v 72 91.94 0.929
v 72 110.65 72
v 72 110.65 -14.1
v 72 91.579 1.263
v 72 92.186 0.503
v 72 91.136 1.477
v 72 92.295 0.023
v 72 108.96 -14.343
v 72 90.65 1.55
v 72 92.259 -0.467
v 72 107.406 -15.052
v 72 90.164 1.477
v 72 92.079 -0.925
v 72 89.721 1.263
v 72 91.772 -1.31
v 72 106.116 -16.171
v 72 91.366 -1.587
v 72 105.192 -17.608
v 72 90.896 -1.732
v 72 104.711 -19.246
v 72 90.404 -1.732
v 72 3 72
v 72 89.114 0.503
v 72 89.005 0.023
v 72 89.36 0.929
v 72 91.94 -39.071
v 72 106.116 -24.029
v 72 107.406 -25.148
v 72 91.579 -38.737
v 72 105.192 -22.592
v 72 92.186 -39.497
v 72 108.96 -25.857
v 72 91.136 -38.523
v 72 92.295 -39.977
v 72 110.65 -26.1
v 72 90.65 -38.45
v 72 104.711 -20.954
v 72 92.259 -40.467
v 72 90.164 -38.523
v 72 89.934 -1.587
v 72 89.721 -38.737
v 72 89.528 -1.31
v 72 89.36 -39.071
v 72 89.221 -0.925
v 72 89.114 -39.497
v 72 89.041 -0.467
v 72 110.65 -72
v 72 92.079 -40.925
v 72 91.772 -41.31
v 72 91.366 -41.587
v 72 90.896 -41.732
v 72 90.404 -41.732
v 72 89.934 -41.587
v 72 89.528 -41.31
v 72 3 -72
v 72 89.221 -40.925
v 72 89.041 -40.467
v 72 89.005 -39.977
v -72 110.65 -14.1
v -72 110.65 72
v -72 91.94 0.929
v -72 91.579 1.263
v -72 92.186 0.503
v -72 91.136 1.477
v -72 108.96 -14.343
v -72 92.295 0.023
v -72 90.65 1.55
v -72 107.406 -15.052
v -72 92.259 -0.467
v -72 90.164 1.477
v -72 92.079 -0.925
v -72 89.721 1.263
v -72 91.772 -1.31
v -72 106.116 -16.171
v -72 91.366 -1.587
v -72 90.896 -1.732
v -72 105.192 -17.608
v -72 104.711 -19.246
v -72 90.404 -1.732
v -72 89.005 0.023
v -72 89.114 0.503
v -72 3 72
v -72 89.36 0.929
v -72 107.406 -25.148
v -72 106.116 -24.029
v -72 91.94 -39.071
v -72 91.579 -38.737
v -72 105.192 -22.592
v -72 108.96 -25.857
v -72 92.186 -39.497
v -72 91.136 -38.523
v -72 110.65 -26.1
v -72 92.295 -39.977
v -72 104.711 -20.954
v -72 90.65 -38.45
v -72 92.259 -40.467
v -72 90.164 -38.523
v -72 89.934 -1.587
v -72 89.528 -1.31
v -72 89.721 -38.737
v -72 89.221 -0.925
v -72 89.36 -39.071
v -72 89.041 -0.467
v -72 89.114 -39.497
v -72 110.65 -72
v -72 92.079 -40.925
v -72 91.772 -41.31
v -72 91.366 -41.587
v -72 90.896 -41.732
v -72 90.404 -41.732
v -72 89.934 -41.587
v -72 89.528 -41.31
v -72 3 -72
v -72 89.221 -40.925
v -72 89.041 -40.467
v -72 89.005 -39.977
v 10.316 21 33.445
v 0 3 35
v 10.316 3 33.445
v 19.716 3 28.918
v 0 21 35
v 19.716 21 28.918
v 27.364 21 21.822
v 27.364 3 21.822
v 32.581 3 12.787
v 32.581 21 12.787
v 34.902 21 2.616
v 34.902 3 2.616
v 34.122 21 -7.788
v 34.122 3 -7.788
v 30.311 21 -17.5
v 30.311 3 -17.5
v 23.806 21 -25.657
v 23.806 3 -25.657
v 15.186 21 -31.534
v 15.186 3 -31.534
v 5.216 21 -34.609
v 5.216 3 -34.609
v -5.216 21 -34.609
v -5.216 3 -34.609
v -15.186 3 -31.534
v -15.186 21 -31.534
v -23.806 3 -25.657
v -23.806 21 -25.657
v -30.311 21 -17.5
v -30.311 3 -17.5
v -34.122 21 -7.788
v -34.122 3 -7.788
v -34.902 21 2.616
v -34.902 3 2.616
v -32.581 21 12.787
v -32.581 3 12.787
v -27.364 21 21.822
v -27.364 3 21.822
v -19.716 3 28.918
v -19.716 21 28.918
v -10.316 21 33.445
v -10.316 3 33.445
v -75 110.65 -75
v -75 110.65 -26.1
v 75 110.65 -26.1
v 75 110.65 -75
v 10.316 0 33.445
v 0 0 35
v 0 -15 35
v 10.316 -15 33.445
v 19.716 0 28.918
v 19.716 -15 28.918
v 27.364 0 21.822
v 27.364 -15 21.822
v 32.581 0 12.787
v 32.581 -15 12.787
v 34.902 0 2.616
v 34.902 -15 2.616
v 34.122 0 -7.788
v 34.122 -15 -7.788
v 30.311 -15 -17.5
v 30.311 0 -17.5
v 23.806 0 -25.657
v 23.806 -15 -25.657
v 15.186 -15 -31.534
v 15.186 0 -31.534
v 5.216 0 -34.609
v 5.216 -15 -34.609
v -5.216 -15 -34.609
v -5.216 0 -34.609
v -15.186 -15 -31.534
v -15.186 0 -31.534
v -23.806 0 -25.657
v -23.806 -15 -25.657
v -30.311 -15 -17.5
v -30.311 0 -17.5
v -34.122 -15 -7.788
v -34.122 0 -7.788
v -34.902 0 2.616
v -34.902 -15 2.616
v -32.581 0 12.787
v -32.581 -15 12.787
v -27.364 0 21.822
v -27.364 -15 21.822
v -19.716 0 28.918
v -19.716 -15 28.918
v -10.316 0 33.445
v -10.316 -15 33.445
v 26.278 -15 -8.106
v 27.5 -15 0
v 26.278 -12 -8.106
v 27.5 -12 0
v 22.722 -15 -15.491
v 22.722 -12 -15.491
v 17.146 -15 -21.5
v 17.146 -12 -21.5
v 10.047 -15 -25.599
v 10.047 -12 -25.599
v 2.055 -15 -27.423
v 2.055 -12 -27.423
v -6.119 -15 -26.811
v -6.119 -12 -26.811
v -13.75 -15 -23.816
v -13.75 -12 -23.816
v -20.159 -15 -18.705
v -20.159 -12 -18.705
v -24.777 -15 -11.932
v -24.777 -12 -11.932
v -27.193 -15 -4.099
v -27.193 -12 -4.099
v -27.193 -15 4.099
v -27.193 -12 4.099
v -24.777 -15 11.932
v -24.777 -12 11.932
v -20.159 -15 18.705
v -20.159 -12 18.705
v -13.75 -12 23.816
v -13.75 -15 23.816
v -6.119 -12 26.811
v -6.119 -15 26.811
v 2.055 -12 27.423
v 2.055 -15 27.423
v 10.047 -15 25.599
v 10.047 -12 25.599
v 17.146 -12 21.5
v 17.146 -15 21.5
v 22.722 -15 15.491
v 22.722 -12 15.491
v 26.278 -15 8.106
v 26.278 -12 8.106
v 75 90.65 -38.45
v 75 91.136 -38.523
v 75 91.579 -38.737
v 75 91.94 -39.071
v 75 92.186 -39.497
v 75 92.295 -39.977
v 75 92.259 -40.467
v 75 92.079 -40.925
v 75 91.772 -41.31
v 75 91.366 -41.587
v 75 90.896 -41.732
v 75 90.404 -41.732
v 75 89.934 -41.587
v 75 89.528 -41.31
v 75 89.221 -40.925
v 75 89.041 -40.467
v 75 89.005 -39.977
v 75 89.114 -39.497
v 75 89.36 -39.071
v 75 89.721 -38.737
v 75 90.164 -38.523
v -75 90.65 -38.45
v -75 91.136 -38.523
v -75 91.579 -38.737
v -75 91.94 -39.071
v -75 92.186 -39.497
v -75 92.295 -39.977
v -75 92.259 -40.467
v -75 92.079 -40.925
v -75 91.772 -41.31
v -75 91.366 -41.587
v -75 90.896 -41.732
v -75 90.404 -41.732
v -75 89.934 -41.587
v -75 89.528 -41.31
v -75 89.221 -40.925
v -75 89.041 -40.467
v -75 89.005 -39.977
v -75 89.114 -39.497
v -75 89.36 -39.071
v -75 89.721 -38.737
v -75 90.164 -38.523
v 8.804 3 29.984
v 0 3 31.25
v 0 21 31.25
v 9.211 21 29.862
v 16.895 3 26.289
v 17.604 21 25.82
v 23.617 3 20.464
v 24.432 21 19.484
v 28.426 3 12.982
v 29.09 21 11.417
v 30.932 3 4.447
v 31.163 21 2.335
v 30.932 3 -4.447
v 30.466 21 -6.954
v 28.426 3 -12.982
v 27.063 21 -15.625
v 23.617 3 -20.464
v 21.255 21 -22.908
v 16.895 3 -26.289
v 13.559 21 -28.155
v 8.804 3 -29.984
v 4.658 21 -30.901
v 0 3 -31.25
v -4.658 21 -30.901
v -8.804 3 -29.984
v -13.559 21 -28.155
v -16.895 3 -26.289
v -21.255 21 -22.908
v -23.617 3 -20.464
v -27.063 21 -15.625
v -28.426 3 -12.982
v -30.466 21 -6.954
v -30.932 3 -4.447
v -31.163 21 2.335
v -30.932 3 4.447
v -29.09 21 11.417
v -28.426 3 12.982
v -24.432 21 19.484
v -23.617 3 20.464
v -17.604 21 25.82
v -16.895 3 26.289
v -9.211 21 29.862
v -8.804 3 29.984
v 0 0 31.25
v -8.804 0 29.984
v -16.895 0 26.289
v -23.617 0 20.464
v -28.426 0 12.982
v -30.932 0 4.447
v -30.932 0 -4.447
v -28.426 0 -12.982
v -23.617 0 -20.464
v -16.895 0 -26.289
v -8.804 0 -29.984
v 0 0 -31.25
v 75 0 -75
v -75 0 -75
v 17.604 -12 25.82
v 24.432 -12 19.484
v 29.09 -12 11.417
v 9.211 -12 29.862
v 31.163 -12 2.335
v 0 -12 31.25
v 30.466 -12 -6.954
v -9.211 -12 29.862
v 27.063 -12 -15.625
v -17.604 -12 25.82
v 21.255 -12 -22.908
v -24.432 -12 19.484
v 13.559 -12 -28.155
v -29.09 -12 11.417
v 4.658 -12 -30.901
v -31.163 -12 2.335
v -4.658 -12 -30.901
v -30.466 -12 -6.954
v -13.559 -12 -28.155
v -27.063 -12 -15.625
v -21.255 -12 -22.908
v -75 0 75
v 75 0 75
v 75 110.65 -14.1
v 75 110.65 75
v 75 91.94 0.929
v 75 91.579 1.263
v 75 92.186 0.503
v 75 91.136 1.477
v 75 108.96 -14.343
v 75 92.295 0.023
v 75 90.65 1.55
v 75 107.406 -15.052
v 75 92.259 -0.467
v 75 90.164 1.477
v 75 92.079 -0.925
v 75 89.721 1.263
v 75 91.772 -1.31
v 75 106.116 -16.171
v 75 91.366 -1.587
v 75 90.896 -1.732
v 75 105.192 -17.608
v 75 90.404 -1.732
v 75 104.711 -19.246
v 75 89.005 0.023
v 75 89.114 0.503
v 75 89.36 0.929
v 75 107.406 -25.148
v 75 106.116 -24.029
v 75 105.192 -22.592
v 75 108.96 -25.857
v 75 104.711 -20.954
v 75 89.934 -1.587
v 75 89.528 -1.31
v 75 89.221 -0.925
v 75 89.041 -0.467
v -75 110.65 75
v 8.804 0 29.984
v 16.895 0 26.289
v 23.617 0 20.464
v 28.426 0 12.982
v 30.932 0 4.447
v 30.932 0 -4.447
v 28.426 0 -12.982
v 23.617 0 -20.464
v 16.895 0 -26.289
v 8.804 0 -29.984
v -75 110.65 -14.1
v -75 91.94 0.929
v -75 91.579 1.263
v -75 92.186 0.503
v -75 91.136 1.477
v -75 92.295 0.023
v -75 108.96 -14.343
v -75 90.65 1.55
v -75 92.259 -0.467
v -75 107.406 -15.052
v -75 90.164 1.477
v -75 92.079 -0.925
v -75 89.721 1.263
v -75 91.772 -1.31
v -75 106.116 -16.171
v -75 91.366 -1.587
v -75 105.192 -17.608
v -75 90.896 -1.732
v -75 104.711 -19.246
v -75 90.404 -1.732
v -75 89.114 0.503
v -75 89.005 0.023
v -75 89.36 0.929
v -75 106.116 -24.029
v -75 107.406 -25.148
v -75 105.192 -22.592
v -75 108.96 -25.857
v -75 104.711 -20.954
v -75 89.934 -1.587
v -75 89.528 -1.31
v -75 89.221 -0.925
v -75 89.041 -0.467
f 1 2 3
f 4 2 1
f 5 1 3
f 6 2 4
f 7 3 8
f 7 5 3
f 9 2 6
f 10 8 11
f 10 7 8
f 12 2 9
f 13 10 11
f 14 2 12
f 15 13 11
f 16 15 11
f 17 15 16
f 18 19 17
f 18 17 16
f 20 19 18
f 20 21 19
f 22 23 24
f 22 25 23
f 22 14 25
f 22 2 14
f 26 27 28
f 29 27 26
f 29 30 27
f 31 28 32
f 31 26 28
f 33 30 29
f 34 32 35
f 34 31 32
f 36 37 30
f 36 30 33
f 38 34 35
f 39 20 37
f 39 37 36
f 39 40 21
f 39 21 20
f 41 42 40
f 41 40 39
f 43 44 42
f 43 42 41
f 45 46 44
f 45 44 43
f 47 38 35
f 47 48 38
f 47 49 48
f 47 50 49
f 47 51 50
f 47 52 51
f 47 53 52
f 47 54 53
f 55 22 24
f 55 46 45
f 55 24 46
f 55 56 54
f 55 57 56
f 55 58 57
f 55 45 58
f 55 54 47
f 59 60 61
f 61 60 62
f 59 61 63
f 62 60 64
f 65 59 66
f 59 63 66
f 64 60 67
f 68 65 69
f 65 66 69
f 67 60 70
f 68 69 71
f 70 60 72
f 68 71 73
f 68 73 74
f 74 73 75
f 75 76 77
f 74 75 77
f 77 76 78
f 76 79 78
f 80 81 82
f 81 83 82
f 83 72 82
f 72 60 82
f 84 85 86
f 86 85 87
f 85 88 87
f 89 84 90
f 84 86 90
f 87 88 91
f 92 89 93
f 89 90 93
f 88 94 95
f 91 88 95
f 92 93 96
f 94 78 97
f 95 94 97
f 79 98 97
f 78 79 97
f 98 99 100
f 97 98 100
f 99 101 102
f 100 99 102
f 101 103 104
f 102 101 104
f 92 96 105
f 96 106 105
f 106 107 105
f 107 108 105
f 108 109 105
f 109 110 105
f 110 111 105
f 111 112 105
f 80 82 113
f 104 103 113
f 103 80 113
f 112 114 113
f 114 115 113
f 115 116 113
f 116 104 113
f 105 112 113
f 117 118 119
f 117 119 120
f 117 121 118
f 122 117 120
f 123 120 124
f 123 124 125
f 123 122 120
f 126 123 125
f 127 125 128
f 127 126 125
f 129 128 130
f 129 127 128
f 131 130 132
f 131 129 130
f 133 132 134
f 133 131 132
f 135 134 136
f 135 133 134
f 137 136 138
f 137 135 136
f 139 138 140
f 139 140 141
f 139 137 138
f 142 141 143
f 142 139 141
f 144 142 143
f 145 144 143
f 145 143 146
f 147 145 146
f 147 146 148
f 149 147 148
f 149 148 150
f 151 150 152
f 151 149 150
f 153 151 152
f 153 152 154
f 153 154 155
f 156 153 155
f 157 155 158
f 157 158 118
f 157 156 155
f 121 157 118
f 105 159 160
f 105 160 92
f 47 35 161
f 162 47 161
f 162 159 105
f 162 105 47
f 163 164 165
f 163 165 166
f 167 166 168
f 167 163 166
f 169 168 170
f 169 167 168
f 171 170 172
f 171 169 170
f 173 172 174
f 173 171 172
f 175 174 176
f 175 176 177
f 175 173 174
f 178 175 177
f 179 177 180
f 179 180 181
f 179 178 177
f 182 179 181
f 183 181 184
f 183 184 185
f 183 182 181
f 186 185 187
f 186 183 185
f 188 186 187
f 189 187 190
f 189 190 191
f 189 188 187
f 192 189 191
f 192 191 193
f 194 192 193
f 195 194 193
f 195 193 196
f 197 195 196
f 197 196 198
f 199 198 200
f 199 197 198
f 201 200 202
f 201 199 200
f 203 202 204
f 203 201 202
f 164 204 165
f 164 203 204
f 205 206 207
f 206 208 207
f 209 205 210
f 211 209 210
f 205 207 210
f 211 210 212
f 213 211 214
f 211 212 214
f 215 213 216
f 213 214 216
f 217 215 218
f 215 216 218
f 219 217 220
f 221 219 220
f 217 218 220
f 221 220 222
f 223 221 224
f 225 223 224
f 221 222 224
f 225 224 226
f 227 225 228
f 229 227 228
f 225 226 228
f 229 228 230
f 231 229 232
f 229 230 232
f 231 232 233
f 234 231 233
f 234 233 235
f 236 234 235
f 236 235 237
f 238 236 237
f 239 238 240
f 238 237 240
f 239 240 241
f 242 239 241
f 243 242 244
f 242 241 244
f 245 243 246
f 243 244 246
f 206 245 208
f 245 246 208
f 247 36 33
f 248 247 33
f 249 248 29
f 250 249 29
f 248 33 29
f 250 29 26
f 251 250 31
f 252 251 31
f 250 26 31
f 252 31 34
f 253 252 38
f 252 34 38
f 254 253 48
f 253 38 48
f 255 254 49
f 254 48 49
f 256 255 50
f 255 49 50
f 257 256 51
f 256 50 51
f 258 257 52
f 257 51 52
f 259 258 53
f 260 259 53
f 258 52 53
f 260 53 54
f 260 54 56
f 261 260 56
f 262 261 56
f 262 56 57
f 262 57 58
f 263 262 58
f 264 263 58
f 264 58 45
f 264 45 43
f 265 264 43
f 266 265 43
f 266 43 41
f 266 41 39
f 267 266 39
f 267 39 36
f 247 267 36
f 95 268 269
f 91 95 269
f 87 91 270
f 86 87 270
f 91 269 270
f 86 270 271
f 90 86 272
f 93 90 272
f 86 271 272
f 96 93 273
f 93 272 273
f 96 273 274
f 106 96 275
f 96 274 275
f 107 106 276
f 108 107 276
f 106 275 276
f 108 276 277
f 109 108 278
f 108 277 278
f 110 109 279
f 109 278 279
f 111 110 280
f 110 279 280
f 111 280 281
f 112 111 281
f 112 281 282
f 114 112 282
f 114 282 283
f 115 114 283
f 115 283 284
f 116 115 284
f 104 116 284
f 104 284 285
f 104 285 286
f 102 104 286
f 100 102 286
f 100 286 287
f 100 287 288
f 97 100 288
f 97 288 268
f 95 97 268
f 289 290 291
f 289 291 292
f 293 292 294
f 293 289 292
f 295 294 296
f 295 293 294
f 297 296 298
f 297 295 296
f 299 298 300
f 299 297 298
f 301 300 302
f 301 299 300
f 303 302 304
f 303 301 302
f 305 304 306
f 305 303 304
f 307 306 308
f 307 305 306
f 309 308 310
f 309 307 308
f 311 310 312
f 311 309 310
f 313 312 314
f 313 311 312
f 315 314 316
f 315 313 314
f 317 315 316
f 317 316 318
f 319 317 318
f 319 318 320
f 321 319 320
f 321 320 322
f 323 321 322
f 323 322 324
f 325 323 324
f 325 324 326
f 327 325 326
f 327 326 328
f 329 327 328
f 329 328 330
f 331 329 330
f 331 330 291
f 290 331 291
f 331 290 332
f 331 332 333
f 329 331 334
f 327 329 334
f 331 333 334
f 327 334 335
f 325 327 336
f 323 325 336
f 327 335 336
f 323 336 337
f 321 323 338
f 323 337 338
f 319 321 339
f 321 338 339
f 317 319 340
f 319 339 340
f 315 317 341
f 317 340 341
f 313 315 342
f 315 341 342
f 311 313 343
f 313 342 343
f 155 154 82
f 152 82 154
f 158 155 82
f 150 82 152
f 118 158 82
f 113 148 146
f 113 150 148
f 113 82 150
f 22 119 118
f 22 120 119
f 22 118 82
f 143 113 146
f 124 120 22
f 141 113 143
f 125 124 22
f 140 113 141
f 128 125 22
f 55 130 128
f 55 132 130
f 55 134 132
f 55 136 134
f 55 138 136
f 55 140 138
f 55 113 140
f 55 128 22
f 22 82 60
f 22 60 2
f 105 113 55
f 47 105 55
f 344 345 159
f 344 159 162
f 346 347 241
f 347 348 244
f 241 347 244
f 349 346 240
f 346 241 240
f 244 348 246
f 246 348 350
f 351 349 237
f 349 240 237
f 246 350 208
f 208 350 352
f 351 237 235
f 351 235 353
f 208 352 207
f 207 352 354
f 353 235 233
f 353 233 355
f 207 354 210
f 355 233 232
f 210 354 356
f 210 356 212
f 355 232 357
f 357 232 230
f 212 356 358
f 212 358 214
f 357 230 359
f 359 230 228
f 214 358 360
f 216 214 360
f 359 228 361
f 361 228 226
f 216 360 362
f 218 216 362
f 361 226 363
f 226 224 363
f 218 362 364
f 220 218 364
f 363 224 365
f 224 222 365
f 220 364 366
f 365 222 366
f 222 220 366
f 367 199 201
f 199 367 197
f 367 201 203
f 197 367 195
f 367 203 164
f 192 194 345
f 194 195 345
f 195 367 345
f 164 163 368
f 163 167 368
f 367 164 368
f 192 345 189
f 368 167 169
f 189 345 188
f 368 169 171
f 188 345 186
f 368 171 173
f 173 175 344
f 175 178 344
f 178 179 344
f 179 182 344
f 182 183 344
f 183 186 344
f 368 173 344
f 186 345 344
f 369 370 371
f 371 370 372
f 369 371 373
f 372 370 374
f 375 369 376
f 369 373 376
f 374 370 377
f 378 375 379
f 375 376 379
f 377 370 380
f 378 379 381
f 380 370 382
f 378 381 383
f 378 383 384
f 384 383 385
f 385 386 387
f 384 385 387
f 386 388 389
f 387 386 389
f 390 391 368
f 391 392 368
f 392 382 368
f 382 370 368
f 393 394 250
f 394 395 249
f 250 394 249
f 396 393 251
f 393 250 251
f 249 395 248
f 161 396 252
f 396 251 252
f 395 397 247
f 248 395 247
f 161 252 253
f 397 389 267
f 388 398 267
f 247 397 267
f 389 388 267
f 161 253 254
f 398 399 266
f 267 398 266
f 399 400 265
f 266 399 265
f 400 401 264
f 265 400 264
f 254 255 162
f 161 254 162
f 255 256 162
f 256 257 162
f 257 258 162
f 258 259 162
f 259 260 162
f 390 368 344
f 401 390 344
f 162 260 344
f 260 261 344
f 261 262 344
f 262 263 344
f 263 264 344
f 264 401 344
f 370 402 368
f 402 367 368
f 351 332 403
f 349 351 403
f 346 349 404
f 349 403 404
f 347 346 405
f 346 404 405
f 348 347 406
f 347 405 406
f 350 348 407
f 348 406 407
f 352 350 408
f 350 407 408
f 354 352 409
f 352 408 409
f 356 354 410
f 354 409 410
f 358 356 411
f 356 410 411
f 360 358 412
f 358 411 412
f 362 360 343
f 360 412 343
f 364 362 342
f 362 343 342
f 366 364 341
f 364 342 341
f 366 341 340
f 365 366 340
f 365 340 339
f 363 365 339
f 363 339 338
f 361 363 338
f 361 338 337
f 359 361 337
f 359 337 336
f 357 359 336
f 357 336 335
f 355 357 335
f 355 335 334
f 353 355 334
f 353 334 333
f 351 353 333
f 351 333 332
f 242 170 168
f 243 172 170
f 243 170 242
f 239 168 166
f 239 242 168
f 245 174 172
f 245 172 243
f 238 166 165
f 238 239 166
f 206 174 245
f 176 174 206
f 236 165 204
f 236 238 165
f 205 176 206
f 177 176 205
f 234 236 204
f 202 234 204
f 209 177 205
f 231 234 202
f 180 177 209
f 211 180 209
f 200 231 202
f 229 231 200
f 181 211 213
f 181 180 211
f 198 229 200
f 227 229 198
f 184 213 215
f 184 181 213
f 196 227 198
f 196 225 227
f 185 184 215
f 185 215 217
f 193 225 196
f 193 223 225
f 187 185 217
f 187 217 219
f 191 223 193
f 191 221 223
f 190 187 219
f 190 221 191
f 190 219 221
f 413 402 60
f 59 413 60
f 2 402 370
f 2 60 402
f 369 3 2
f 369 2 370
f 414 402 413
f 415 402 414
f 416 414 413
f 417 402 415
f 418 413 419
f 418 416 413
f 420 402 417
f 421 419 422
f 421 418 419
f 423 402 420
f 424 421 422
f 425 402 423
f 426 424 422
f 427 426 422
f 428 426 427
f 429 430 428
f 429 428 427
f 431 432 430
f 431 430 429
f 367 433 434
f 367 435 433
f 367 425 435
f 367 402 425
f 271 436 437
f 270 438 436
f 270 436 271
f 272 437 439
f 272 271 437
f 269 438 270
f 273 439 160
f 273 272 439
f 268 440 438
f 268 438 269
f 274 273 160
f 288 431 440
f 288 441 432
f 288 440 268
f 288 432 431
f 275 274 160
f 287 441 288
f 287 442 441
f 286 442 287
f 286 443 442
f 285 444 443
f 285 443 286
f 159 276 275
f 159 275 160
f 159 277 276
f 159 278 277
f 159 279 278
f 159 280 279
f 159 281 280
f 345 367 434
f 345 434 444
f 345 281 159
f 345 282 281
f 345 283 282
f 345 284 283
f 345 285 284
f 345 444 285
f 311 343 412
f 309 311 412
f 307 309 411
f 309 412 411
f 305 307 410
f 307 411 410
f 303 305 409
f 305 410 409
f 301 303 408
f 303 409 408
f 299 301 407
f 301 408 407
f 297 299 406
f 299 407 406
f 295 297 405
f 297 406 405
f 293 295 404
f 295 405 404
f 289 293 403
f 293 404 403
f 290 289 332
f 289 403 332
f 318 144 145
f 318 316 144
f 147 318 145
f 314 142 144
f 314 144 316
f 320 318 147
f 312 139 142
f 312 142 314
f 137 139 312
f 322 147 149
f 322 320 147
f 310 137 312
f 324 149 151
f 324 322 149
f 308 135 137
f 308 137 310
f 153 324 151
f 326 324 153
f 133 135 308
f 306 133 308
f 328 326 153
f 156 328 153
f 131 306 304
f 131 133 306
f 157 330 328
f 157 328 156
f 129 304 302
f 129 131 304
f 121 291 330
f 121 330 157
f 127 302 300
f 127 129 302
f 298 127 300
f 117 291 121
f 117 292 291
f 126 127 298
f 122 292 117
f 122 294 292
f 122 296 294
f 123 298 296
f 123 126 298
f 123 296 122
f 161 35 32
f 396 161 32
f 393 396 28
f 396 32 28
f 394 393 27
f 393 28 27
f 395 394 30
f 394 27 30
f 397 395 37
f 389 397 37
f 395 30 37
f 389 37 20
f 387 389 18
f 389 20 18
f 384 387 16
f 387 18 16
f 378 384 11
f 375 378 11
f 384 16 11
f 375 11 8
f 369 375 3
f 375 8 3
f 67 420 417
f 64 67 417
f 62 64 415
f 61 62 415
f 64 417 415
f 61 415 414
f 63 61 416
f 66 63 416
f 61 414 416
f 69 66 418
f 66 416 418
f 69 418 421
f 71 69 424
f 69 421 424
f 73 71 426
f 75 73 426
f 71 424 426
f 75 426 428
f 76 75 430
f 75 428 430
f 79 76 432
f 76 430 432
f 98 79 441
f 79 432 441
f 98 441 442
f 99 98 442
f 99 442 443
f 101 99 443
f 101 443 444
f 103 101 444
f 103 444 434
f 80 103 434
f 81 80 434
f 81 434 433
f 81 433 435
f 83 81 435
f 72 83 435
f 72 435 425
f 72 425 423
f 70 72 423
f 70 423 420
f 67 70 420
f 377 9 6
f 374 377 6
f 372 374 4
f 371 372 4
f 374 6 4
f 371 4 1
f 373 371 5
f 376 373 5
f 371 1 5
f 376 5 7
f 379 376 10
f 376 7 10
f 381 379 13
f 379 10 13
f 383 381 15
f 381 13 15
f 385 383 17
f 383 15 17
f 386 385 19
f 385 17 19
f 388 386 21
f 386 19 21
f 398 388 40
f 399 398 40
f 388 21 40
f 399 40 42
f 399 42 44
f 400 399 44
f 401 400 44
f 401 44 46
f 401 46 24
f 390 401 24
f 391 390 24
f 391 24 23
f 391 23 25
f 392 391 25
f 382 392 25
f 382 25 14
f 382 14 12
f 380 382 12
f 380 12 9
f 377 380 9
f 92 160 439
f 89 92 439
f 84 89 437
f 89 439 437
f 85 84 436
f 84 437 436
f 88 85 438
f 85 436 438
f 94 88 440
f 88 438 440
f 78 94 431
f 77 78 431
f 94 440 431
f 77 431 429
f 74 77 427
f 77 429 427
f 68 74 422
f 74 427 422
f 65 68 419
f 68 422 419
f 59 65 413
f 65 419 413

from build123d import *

# Parameters (mm, degrees)
SKETCH_1_W          = 150
SKETCH_1_H          = 150
EXTRUDE_1_DEPTH     = 3
SKETCH_2_W          = 150
SKETCH_2_H          = 150
SKETCH_2_W_2        = 144
SKETCH_2_H_2        = 144
EXTRUDE_2_DEPTH     = 107.65
SKETCH_3_R          = 31.25
CUT_EXTRUDE_1_DEPTH = 91
SKETCH_4_R          = 6
CUT_EXTRUDE_2_DEPTH = 201.9189451
SKETCH_8_R          = 35
SKETCH_8_R_2        = 31.25
EXTRUDE_4_DEPTH     = 18
SKETCH_9_R          = 1.65
CUT_EXTRUDE_3_DEPTH = 201.9189451
SKETCH_11_R         = 31.25
SKETCH_11_R_2       = 27.5
EXTRUDE_5_DEPTH     = 3


with BuildPart() as part:
    # 草图1 → 凸台-拉伸1 (new body)
    with BuildSketch(Plane(origin=(0, 0, 0), x_dir=(1, 0, 0), z_dir=(0, 1, 0))):
        Rectangle(SKETCH_1_W, SKETCH_1_H)
    extrude(amount=EXTRUDE_1_DEPTH)

    # 草图2 → 凸台-拉伸2 (add)
    with BuildSketch(Plane(origin=(0, 3, 0), x_dir=(1, 0, 0), z_dir=(0, 1, 0))):
        Rectangle(SKETCH_2_W, SKETCH_2_H)
        Rectangle(SKETCH_2_W_2, SKETCH_2_H_2, mode=Mode.SUBTRACT)
    extrude(amount=EXTRUDE_2_DEPTH)

    # 草图3 → 切除-拉伸1 (cut)
    with BuildSketch(Plane.XZ):
        Circle(SKETCH_3_R)
    extrude(amount=-CUT_EXTRUDE_1_DEPTH, mode=Mode.SUBTRACT)

    # 草图4 → 切除-拉伸2 (cut, through all)
    with BuildSketch(Plane.ZY.offset(75)):
        with Locations((-20.1, 110.65)):
            Circle(SKETCH_4_R)
    extrude(amount=-CUT_EXTRUDE_2_DEPTH, mode=Mode.SUBTRACT)

    # 草图8 → 凸台-拉伸4 (add, symmetric)
    with BuildSketch(Plane(origin=(0, 3, 0), x_dir=(1, 0, 0), z_dir=(0, 1, 0))):
        Circle(SKETCH_8_R)
        Circle(SKETCH_8_R_2, mode=Mode.SUBTRACT)
    extrude(amount=EXTRUDE_4_DEPTH, both=True)

    # 草图9 → 切除-拉伸3 (cut, through all)
    with BuildSketch(Plane.ZY.offset(75)):
        with Locations((-40.1, 90.65)):
            Circle(SKETCH_9_R)
        with Locations((-0.1, 90.65)):
            Circle(SKETCH_9_R)
    extrude(amount=-CUT_EXTRUDE_3_DEPTH, mode=Mode.SUBTRACT)

    # 草图11 → 凸台-拉伸5 (add)
    with BuildSketch(Plane.XZ.offset(15)):
        Circle(SKETCH_11_R)
        Circle(SKETCH_11_R_2, mode=Mode.SUBTRACT)
    extrude(amount=-EXTRUDE_5_DEPTH)


solid = part.part
